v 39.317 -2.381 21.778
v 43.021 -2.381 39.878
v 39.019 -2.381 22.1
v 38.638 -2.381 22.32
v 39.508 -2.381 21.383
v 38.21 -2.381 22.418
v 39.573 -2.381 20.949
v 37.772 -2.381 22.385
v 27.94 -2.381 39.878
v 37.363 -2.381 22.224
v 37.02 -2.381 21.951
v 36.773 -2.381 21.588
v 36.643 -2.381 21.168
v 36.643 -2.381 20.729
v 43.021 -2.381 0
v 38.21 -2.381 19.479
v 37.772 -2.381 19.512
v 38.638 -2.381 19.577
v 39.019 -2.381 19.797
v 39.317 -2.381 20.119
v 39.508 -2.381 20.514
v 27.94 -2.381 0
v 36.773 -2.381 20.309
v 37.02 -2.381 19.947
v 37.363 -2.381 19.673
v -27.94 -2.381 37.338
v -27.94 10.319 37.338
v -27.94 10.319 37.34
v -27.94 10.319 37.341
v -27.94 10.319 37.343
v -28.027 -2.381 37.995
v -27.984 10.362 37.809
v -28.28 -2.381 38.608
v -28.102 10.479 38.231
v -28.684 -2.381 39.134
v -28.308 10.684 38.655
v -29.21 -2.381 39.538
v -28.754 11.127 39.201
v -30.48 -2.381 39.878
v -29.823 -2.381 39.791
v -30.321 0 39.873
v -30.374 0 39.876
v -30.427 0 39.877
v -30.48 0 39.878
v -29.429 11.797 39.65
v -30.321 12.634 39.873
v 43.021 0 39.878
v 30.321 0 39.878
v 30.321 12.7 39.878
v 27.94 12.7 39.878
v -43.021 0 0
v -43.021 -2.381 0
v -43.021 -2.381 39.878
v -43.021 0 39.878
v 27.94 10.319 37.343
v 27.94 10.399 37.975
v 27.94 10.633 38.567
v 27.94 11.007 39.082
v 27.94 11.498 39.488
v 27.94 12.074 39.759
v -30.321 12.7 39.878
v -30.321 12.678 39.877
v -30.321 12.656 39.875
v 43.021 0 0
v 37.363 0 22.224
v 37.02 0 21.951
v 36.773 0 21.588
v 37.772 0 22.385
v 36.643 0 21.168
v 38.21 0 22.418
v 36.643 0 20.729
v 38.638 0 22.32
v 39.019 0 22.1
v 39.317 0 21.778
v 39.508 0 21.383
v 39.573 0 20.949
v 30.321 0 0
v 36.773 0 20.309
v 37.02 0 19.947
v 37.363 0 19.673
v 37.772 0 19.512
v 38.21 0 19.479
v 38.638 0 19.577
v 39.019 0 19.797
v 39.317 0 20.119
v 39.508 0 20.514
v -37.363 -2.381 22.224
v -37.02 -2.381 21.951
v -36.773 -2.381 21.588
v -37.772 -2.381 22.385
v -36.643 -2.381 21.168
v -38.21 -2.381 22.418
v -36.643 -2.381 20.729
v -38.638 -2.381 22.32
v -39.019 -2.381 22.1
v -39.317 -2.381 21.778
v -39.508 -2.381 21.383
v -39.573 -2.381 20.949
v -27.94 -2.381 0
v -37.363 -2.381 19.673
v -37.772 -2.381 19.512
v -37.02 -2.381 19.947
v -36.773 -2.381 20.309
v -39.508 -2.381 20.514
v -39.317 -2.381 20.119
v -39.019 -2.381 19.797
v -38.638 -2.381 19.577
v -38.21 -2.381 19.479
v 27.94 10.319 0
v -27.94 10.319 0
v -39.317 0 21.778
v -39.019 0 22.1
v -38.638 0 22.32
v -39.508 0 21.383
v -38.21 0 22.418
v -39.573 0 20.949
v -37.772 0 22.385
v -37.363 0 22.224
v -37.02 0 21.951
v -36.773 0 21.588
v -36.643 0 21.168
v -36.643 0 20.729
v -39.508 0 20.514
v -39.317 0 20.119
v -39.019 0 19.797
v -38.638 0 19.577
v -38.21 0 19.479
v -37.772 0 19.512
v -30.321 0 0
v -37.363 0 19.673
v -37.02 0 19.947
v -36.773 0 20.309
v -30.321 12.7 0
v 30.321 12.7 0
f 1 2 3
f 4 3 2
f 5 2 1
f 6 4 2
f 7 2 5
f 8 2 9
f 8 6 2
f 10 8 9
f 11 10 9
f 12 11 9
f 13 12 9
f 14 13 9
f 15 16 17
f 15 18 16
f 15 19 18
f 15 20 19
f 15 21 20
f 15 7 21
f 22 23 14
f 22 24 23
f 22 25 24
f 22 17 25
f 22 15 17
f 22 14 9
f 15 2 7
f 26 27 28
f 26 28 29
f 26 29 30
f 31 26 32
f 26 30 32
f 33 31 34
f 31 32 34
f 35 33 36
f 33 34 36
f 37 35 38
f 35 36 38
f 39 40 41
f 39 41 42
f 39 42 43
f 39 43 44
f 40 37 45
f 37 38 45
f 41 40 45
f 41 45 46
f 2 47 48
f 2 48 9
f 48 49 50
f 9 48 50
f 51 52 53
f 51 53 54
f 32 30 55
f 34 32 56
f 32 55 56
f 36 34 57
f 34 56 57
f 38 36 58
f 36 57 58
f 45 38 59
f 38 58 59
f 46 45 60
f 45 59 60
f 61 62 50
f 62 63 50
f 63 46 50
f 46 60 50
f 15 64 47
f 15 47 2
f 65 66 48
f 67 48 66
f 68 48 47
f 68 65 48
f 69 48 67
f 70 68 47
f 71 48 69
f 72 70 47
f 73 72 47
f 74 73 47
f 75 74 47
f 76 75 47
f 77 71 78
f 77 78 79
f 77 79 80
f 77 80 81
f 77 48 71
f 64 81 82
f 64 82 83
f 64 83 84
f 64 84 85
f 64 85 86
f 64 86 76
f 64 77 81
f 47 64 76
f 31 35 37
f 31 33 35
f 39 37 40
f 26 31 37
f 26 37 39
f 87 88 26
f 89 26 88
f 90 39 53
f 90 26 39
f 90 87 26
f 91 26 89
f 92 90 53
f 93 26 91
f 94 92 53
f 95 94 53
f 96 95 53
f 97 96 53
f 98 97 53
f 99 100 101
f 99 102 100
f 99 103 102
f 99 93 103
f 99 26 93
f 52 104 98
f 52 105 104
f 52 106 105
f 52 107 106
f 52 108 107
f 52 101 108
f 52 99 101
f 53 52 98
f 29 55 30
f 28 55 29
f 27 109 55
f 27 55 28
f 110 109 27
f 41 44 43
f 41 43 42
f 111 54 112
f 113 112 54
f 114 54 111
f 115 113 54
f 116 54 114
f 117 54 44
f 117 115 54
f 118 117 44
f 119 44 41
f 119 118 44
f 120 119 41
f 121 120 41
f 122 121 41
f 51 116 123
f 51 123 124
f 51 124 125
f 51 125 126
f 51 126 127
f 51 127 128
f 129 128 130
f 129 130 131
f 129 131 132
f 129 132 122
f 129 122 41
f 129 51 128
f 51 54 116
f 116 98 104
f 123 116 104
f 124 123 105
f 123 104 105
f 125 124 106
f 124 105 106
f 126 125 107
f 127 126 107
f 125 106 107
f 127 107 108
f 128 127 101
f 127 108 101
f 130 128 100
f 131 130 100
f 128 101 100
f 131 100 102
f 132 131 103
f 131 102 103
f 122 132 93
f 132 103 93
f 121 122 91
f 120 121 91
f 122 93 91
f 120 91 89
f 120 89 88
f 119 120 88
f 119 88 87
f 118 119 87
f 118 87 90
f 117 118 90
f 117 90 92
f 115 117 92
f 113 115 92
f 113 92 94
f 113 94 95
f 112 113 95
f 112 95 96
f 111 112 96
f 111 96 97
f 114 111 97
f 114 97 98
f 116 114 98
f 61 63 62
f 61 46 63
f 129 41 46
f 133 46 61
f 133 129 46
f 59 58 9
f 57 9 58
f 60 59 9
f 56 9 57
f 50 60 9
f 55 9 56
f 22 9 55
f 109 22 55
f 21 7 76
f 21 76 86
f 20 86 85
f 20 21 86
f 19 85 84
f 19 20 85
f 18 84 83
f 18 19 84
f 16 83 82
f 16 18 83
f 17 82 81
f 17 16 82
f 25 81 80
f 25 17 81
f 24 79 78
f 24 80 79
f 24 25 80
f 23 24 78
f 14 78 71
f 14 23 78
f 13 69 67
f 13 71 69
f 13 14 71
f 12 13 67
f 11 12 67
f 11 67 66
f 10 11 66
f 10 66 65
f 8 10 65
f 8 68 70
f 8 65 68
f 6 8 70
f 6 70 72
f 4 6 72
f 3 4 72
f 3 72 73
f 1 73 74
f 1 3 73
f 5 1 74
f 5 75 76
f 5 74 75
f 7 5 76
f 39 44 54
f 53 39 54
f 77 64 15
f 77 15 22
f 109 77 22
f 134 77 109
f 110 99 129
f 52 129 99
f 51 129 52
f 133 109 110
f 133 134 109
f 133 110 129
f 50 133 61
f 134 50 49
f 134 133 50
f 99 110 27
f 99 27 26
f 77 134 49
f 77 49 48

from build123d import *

# Parameters (mm, degrees)
BOSS_EXTRUDE1_DEPTH   = 39.878
F_4_CLEARANCE_HOLE1_D = 2.9464
FILLET1_R             = 2.54
FILLET2_R             = 2.54


with BuildPart() as part:
    # Sketch1 → Boss-Extrude1 (new body)
    with BuildSketch(Plane.XY):
        Polygon((-43.02125, 0), (-30.32125, 0), (-30.32125, 12.7), (30.32125, 12.7), (30.32125, 0), (43.02125, 0), (43.02125, -2.38125), (27.94, -2.38125), (27.94, 10.31875), (-27.94, 10.31875), (-27.94, -2.38125), (-43.02125, -2.38125), align=None)
    extrude(amount=BOSS_EXTRUDE1_DEPTH)

    # #4 Clearance Hole1 (through all)
    with Locations(Plane(origin=(0, 0, 0), x_dir=(1, 0, 0), z_dir=(0, 1, 0))):
        with Locations((-38.1, -20.948579073)):
            f_4_clearance_hole1 = Hole(F_4_CLEARANCE_HOLE1_D / 2)

    # Mirror1: #4 Clearance Hole1 across plane
    add(f_4_clearance_hole1.mirror(Plane(origin=(0, 0, 0), x_dir=(0, 0, 1), z_dir=(1, 0, 0))), mode=Mode.SUBTRACT)

    # Fillet1
    # the kernel refuses this fillet: 2.54 mm, written as the material it takes off along each edge
    with BuildSketch(Plane(origin=(-27.94, 10.31875, 39.878), x_dir=(-1, 0, 0), z_dir=(0, -1, 0))) as fillet1_piece_1:
        with BuildLine():
            CenterArc((FILLET1_R, FILLET1_R), FILLET1_R, 180, 90)
            Line((0, FILLET1_R), (0, 0))
            Line((0, 0), (FILLET1_R, 0))
        make_face()
    extrude(amount=19.05, mode=Mode.SUBTRACT)

    # Fillet2
    # the kernel refuses this fillet: 2.54 mm, written as the material it takes off along each edge
    with BuildSketch(Plane(origin=(27.94, 10.31875, 39.878), x_dir=(0, 0, -1), z_dir=(-1, 0, 0))) as fillet2_piece_1_section:
        with BuildLine():
            CenterArc((2.535034208, -2.54), FILLET2_R, 90, 86.416678302)
            Line((0, -2.38125), (0, 0))
            Line((0, 0), (2.535034208, 0))
        make_face()
    fillet2_piece_1 = extrude(amount=64.598835521, mode=Mode.PRIVATE)
    fillet2_piece_1 = fillet2_piece_1 - Plane(origin=(-30.48, 11.003720119, 37.338), x_dir=(-1, 0, 0), z_dir=(0, 1, 0)) * Cylinder(2.54, 140, mode=Mode.PRIVATE)
    add(fillet2_piece_1, mode=Mode.SUBTRACT)


solid = part.part
